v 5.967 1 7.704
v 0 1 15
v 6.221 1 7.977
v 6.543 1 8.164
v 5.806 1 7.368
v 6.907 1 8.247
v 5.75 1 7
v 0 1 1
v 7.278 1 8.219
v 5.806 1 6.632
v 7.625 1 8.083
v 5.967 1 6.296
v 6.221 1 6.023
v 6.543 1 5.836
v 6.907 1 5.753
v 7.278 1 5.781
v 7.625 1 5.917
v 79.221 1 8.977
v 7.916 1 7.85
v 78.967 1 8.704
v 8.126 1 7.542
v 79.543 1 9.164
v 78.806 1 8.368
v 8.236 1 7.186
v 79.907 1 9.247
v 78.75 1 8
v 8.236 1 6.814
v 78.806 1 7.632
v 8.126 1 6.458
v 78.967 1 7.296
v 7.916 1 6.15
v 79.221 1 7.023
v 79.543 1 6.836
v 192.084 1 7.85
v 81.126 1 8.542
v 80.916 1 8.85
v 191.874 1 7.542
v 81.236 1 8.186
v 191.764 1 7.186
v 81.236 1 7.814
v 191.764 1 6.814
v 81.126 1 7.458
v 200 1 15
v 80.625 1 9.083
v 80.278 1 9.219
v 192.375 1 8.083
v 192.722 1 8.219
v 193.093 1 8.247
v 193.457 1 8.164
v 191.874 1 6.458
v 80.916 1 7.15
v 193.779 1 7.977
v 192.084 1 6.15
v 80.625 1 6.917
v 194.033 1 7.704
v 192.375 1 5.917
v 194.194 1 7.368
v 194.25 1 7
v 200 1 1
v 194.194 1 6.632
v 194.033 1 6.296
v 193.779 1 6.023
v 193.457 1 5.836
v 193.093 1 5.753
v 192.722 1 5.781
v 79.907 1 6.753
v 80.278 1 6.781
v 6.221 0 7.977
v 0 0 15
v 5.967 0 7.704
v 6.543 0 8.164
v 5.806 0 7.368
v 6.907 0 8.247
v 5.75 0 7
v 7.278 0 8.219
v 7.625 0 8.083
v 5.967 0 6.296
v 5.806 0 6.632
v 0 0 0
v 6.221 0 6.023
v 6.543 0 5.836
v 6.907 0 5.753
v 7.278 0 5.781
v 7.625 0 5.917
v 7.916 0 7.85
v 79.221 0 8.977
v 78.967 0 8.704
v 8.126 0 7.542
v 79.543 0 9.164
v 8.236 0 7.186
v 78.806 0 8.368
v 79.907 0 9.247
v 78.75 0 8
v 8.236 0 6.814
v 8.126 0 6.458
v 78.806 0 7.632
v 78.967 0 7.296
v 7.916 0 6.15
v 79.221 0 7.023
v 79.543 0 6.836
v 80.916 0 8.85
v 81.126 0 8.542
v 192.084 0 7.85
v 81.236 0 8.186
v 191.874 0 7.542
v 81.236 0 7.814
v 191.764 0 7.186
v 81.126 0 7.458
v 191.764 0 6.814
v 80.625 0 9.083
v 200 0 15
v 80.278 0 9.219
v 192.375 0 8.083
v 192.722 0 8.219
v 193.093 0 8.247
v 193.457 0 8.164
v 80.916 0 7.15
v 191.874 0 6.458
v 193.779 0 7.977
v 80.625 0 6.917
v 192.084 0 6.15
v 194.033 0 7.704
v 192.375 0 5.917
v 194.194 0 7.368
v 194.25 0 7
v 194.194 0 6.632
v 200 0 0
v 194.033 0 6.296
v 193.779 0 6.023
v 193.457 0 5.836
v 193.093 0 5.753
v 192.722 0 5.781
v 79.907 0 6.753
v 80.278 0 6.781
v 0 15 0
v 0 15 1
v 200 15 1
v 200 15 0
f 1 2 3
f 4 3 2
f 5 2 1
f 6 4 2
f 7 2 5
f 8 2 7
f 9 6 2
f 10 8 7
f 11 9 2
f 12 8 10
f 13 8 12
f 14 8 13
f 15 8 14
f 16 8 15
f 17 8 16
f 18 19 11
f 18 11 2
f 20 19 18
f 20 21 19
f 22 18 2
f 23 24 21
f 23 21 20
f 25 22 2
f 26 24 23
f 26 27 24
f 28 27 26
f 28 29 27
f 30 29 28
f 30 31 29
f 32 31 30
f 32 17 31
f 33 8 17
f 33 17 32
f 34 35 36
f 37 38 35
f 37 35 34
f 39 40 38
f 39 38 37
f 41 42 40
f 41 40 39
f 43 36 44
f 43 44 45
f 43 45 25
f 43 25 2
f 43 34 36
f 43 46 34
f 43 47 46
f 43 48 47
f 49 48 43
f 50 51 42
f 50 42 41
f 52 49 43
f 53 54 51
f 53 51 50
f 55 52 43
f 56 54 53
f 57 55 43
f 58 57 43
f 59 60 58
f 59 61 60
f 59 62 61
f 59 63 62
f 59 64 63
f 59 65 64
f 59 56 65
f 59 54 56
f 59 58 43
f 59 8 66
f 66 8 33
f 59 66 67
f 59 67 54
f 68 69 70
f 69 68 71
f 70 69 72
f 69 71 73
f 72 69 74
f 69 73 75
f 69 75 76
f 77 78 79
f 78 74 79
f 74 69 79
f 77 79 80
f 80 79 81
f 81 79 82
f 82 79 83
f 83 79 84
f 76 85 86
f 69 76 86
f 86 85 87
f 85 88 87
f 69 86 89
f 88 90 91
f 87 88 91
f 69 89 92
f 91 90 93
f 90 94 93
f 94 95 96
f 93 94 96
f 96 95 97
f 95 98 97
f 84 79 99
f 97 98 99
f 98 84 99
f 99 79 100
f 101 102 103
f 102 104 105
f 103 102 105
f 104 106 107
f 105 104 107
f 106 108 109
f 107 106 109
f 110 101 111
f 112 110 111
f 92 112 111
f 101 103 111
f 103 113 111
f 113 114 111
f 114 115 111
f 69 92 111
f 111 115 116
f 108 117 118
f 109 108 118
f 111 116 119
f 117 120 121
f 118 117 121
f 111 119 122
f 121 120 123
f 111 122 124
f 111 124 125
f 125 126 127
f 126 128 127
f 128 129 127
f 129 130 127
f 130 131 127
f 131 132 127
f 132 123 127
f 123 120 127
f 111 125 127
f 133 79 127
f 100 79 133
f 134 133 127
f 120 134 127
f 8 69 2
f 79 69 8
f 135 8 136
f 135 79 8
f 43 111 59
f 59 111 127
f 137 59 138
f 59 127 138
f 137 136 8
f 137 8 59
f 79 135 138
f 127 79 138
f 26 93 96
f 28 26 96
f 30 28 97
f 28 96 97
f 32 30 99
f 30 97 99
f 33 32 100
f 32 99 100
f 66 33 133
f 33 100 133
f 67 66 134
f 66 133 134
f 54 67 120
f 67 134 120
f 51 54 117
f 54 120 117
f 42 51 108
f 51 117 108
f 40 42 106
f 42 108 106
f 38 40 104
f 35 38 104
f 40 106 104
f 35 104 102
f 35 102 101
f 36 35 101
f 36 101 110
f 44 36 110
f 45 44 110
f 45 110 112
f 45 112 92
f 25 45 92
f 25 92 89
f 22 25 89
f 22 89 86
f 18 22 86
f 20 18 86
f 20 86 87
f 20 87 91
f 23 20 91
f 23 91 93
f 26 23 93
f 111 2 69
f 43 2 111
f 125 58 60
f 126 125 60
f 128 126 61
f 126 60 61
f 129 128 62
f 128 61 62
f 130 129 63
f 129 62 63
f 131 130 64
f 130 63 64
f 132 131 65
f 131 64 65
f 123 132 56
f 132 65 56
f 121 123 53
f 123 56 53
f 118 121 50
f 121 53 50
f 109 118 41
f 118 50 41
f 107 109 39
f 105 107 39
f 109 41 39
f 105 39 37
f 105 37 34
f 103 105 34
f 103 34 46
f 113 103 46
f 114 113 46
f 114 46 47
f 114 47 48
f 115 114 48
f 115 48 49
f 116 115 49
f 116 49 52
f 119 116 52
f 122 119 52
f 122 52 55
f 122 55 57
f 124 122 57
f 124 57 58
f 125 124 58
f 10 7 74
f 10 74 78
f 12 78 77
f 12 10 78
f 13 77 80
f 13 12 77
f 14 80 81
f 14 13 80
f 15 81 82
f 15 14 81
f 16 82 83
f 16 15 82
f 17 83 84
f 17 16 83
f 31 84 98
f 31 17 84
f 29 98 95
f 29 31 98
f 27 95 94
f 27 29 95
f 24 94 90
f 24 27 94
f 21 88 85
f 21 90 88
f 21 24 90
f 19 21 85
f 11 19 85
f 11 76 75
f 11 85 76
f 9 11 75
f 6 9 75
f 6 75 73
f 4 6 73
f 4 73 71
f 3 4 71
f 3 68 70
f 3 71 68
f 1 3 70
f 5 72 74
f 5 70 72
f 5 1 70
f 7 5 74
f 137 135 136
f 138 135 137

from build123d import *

# Parameters (mm, degrees)
SKETCH_1_W      = 200
SKETCH_1_H      = 15
EXTRUDE_1_DEPTH = 1
SKETCH_2_W      = 200
SKETCH_2_H      = 1
EXTRUDE_2_DEPTH = 14
M3X0_5_1_D      = 2.5
M3X0_5_2_D      = 2.5


with BuildPart() as part:
    # ｽｹｯﾁ1 → ﾎﾞｽ - 押し出し1 (new body)
    with BuildSketch(Plane.XY):
        with Locations((100, 7.5)):
            Rectangle(SKETCH_1_W, SKETCH_1_H)
    extrude(amount=EXTRUDE_1_DEPTH)

    # ｽｹｯﾁ2 → ﾎﾞｽ - 押し出し2 (add)
    with BuildSketch(Plane.XY.offset(1)):
        with Locations((100, 0.5)):
            Rectangle(SKETCH_2_W, SKETCH_2_H)
    extrude(amount=EXTRUDE_2_DEPTH)

    # M3x0.5 ねじ穴1 (through all)
    with Locations(Plane(origin=(0, 0, 0), x_dir=(-1, 0, 0), z_dir=(0, -1, 0))):
        with Locations((-193, -7)):
            m3x0_5_1 = Hole(M3X0_5_1_D / 2)

    # M3x0.5 ねじ穴2 (through all)
    with Locations(Plane(origin=(0, 1, 0), x_dir=(1, 0, 0), z_dir=(0, 1, 0))):
        with Locations((80, -8)):
            Hole(M3X0_5_2_D / 2)

    # ﾐﾗｰ1: M3x0.5 ねじ穴1 across plane
    add(m3x0_5_1.mirror(Plane(origin=(100, 0, 0), x_dir=(0, 0, 1), z_dir=(1, 0, 0))), mode=Mode.SUBTRACT)


solid = part.part
